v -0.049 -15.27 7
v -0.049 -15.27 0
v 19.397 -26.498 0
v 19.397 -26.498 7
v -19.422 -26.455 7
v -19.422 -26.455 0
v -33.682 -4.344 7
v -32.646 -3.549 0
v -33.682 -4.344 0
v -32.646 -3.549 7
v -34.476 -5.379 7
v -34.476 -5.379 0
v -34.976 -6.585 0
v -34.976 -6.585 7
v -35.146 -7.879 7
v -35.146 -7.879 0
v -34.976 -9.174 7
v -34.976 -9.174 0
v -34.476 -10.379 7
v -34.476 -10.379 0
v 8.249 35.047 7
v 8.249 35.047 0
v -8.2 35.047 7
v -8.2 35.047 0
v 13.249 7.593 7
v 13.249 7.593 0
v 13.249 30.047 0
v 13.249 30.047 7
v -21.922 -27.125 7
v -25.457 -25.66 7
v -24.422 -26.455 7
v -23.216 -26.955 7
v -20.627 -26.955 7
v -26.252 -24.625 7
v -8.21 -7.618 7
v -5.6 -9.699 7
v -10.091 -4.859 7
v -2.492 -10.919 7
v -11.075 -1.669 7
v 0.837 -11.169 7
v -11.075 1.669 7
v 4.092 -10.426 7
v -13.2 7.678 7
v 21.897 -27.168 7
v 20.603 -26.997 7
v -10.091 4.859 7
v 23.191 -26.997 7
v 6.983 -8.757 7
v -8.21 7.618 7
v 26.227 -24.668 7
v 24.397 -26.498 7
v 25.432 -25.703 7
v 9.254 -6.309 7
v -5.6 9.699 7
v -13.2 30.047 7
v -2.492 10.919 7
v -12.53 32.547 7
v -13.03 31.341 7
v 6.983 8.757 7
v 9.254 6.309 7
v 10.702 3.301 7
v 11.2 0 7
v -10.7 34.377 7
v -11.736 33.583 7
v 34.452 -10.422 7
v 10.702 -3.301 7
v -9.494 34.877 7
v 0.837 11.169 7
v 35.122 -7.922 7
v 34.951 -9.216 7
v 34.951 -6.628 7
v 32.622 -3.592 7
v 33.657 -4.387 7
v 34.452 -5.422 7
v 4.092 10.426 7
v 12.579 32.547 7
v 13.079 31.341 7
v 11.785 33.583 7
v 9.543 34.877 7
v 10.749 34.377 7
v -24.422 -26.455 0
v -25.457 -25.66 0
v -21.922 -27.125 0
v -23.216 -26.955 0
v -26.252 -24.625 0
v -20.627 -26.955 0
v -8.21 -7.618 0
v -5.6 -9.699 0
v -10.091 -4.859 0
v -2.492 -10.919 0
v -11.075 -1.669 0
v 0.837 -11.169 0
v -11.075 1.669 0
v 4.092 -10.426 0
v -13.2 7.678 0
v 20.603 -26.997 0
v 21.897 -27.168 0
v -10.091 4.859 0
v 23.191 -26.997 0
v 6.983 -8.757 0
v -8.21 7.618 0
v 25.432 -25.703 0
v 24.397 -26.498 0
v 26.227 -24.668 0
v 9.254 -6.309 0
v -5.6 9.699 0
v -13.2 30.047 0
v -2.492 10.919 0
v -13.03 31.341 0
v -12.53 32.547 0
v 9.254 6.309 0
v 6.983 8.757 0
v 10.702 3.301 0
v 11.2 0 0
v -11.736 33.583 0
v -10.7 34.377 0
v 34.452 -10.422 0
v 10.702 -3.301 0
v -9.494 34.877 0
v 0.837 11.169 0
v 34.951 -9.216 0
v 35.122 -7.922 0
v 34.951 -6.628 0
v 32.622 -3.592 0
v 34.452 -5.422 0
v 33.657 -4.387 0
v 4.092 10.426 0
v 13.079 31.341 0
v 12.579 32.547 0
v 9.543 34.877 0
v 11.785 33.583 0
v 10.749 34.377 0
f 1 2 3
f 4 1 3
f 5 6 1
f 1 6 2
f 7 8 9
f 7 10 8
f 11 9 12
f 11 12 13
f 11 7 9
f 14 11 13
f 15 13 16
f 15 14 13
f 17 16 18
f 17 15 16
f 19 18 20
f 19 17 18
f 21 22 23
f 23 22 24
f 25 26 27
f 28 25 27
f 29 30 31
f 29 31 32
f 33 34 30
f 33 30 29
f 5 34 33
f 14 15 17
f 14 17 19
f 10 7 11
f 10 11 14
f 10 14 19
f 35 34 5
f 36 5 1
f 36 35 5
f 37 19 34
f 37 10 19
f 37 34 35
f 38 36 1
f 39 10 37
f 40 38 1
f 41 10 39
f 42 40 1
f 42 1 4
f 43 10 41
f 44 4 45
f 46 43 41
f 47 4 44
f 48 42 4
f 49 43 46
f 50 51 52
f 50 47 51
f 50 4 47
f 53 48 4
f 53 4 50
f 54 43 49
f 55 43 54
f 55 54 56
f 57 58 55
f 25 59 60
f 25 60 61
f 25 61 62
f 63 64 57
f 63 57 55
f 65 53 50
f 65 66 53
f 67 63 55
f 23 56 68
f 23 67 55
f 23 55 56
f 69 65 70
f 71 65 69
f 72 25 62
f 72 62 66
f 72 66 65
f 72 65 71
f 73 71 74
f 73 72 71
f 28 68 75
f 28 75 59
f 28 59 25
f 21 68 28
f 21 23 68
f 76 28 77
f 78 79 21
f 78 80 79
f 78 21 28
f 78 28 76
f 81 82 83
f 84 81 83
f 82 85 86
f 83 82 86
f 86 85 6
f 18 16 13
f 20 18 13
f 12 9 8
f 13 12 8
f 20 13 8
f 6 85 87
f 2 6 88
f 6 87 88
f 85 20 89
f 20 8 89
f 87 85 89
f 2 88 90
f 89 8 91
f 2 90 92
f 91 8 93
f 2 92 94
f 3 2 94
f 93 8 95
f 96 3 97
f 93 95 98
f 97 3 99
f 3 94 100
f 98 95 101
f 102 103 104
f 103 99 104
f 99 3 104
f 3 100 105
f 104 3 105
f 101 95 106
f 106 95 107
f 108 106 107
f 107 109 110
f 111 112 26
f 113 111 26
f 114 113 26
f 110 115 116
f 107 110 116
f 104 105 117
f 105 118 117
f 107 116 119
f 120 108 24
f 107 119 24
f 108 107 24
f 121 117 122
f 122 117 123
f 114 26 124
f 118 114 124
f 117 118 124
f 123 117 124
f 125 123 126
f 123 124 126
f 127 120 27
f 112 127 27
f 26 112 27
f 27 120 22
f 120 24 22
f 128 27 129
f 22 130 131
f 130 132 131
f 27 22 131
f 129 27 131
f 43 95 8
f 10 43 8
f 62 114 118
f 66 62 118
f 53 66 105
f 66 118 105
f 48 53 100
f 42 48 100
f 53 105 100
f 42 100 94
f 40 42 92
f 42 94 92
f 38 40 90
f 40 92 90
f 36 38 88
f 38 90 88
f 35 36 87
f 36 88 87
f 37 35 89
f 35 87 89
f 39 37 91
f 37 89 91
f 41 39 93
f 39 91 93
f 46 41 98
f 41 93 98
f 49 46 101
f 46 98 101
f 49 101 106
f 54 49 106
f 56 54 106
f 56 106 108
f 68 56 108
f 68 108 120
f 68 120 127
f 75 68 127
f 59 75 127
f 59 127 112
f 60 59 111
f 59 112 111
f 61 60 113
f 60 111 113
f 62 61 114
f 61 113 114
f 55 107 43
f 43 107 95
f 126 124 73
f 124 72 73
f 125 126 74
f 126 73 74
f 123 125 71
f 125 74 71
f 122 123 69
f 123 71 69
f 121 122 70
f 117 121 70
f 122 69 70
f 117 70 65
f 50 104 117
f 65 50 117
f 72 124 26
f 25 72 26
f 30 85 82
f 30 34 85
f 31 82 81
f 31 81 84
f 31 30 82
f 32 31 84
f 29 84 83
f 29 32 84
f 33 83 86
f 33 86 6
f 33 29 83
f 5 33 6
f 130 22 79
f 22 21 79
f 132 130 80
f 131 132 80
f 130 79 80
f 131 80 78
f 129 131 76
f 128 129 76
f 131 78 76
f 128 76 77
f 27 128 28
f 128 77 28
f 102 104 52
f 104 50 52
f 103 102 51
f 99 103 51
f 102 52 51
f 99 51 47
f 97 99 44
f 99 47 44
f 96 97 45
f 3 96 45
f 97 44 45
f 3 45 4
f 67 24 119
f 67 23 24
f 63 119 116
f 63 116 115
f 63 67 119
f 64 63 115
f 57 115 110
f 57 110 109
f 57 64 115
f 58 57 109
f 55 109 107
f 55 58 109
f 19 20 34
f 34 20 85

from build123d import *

# Parameters (mm, degrees)
F1_DEPTH = 7
F2_DEPTH = 7
F3_R     = 5


with BuildPart() as f1:
    # F0 (on Top) → F1 (new body)
    with BuildSketch(Plane.XY):
        Polygon((13.249245, 35.047099), (-13.2, 35.047099), (-13.2, 7.677887), (-36.976301, -6.049366), (-23.751678, -28.955085), (-0.049245, -15.270479), (23.727055, -28.997733), (36.951678, -6.092014), (13.249245, 7.592592), align=None)
        with BuildLine():
            ThreePointArc((-11.2, 0), (0, 11.2), (11.2, 0))
            ThreePointArc((11.2, 0), (0, -11.2), (-11.2, 0))
        make_face(mode=Mode.SUBTRACT)
    extrude(amount=F1_DEPTH)

    # F0 (on Top) → F2 (join)
    with BuildSketch(Plane.XY):
        Polygon((13.249245, 35.047099), (-13.2, 35.047099), (-13.2, 7.677887), (-36.976301, -6.049366), (-23.751678, -28.955085), (-0.049245, -15.270479), (23.727055, -28.997733), (36.951678, -6.092014), (13.249245, 7.592592), align=None)
        with BuildLine():
            ThreePointArc((-11.2, 0), (0, 11.2), (11.2, 0))
            ThreePointArc((11.2, 0), (0, -11.2), (-11.2, 0))
        make_face(mode=Mode.SUBTRACT)
    extrude(amount=F2_DEPTH)

    # F3
    f3_edges = [f1.edges().sort_by_distance(p)[0] for p in [
        (-13.2, 35.047099, 3.5),
        (13.249245, 35.047099, 3.5),
        (36.951678, -6.092014, 3.5),
        (23.727055, -28.997733, 3.5),
        (-23.751678, -28.955085, 3.5),
        (-36.976301, -6.049366, 3.5),
    ]]
    fillet(f3_edges, radius=F3_R)


solid = f1.part
